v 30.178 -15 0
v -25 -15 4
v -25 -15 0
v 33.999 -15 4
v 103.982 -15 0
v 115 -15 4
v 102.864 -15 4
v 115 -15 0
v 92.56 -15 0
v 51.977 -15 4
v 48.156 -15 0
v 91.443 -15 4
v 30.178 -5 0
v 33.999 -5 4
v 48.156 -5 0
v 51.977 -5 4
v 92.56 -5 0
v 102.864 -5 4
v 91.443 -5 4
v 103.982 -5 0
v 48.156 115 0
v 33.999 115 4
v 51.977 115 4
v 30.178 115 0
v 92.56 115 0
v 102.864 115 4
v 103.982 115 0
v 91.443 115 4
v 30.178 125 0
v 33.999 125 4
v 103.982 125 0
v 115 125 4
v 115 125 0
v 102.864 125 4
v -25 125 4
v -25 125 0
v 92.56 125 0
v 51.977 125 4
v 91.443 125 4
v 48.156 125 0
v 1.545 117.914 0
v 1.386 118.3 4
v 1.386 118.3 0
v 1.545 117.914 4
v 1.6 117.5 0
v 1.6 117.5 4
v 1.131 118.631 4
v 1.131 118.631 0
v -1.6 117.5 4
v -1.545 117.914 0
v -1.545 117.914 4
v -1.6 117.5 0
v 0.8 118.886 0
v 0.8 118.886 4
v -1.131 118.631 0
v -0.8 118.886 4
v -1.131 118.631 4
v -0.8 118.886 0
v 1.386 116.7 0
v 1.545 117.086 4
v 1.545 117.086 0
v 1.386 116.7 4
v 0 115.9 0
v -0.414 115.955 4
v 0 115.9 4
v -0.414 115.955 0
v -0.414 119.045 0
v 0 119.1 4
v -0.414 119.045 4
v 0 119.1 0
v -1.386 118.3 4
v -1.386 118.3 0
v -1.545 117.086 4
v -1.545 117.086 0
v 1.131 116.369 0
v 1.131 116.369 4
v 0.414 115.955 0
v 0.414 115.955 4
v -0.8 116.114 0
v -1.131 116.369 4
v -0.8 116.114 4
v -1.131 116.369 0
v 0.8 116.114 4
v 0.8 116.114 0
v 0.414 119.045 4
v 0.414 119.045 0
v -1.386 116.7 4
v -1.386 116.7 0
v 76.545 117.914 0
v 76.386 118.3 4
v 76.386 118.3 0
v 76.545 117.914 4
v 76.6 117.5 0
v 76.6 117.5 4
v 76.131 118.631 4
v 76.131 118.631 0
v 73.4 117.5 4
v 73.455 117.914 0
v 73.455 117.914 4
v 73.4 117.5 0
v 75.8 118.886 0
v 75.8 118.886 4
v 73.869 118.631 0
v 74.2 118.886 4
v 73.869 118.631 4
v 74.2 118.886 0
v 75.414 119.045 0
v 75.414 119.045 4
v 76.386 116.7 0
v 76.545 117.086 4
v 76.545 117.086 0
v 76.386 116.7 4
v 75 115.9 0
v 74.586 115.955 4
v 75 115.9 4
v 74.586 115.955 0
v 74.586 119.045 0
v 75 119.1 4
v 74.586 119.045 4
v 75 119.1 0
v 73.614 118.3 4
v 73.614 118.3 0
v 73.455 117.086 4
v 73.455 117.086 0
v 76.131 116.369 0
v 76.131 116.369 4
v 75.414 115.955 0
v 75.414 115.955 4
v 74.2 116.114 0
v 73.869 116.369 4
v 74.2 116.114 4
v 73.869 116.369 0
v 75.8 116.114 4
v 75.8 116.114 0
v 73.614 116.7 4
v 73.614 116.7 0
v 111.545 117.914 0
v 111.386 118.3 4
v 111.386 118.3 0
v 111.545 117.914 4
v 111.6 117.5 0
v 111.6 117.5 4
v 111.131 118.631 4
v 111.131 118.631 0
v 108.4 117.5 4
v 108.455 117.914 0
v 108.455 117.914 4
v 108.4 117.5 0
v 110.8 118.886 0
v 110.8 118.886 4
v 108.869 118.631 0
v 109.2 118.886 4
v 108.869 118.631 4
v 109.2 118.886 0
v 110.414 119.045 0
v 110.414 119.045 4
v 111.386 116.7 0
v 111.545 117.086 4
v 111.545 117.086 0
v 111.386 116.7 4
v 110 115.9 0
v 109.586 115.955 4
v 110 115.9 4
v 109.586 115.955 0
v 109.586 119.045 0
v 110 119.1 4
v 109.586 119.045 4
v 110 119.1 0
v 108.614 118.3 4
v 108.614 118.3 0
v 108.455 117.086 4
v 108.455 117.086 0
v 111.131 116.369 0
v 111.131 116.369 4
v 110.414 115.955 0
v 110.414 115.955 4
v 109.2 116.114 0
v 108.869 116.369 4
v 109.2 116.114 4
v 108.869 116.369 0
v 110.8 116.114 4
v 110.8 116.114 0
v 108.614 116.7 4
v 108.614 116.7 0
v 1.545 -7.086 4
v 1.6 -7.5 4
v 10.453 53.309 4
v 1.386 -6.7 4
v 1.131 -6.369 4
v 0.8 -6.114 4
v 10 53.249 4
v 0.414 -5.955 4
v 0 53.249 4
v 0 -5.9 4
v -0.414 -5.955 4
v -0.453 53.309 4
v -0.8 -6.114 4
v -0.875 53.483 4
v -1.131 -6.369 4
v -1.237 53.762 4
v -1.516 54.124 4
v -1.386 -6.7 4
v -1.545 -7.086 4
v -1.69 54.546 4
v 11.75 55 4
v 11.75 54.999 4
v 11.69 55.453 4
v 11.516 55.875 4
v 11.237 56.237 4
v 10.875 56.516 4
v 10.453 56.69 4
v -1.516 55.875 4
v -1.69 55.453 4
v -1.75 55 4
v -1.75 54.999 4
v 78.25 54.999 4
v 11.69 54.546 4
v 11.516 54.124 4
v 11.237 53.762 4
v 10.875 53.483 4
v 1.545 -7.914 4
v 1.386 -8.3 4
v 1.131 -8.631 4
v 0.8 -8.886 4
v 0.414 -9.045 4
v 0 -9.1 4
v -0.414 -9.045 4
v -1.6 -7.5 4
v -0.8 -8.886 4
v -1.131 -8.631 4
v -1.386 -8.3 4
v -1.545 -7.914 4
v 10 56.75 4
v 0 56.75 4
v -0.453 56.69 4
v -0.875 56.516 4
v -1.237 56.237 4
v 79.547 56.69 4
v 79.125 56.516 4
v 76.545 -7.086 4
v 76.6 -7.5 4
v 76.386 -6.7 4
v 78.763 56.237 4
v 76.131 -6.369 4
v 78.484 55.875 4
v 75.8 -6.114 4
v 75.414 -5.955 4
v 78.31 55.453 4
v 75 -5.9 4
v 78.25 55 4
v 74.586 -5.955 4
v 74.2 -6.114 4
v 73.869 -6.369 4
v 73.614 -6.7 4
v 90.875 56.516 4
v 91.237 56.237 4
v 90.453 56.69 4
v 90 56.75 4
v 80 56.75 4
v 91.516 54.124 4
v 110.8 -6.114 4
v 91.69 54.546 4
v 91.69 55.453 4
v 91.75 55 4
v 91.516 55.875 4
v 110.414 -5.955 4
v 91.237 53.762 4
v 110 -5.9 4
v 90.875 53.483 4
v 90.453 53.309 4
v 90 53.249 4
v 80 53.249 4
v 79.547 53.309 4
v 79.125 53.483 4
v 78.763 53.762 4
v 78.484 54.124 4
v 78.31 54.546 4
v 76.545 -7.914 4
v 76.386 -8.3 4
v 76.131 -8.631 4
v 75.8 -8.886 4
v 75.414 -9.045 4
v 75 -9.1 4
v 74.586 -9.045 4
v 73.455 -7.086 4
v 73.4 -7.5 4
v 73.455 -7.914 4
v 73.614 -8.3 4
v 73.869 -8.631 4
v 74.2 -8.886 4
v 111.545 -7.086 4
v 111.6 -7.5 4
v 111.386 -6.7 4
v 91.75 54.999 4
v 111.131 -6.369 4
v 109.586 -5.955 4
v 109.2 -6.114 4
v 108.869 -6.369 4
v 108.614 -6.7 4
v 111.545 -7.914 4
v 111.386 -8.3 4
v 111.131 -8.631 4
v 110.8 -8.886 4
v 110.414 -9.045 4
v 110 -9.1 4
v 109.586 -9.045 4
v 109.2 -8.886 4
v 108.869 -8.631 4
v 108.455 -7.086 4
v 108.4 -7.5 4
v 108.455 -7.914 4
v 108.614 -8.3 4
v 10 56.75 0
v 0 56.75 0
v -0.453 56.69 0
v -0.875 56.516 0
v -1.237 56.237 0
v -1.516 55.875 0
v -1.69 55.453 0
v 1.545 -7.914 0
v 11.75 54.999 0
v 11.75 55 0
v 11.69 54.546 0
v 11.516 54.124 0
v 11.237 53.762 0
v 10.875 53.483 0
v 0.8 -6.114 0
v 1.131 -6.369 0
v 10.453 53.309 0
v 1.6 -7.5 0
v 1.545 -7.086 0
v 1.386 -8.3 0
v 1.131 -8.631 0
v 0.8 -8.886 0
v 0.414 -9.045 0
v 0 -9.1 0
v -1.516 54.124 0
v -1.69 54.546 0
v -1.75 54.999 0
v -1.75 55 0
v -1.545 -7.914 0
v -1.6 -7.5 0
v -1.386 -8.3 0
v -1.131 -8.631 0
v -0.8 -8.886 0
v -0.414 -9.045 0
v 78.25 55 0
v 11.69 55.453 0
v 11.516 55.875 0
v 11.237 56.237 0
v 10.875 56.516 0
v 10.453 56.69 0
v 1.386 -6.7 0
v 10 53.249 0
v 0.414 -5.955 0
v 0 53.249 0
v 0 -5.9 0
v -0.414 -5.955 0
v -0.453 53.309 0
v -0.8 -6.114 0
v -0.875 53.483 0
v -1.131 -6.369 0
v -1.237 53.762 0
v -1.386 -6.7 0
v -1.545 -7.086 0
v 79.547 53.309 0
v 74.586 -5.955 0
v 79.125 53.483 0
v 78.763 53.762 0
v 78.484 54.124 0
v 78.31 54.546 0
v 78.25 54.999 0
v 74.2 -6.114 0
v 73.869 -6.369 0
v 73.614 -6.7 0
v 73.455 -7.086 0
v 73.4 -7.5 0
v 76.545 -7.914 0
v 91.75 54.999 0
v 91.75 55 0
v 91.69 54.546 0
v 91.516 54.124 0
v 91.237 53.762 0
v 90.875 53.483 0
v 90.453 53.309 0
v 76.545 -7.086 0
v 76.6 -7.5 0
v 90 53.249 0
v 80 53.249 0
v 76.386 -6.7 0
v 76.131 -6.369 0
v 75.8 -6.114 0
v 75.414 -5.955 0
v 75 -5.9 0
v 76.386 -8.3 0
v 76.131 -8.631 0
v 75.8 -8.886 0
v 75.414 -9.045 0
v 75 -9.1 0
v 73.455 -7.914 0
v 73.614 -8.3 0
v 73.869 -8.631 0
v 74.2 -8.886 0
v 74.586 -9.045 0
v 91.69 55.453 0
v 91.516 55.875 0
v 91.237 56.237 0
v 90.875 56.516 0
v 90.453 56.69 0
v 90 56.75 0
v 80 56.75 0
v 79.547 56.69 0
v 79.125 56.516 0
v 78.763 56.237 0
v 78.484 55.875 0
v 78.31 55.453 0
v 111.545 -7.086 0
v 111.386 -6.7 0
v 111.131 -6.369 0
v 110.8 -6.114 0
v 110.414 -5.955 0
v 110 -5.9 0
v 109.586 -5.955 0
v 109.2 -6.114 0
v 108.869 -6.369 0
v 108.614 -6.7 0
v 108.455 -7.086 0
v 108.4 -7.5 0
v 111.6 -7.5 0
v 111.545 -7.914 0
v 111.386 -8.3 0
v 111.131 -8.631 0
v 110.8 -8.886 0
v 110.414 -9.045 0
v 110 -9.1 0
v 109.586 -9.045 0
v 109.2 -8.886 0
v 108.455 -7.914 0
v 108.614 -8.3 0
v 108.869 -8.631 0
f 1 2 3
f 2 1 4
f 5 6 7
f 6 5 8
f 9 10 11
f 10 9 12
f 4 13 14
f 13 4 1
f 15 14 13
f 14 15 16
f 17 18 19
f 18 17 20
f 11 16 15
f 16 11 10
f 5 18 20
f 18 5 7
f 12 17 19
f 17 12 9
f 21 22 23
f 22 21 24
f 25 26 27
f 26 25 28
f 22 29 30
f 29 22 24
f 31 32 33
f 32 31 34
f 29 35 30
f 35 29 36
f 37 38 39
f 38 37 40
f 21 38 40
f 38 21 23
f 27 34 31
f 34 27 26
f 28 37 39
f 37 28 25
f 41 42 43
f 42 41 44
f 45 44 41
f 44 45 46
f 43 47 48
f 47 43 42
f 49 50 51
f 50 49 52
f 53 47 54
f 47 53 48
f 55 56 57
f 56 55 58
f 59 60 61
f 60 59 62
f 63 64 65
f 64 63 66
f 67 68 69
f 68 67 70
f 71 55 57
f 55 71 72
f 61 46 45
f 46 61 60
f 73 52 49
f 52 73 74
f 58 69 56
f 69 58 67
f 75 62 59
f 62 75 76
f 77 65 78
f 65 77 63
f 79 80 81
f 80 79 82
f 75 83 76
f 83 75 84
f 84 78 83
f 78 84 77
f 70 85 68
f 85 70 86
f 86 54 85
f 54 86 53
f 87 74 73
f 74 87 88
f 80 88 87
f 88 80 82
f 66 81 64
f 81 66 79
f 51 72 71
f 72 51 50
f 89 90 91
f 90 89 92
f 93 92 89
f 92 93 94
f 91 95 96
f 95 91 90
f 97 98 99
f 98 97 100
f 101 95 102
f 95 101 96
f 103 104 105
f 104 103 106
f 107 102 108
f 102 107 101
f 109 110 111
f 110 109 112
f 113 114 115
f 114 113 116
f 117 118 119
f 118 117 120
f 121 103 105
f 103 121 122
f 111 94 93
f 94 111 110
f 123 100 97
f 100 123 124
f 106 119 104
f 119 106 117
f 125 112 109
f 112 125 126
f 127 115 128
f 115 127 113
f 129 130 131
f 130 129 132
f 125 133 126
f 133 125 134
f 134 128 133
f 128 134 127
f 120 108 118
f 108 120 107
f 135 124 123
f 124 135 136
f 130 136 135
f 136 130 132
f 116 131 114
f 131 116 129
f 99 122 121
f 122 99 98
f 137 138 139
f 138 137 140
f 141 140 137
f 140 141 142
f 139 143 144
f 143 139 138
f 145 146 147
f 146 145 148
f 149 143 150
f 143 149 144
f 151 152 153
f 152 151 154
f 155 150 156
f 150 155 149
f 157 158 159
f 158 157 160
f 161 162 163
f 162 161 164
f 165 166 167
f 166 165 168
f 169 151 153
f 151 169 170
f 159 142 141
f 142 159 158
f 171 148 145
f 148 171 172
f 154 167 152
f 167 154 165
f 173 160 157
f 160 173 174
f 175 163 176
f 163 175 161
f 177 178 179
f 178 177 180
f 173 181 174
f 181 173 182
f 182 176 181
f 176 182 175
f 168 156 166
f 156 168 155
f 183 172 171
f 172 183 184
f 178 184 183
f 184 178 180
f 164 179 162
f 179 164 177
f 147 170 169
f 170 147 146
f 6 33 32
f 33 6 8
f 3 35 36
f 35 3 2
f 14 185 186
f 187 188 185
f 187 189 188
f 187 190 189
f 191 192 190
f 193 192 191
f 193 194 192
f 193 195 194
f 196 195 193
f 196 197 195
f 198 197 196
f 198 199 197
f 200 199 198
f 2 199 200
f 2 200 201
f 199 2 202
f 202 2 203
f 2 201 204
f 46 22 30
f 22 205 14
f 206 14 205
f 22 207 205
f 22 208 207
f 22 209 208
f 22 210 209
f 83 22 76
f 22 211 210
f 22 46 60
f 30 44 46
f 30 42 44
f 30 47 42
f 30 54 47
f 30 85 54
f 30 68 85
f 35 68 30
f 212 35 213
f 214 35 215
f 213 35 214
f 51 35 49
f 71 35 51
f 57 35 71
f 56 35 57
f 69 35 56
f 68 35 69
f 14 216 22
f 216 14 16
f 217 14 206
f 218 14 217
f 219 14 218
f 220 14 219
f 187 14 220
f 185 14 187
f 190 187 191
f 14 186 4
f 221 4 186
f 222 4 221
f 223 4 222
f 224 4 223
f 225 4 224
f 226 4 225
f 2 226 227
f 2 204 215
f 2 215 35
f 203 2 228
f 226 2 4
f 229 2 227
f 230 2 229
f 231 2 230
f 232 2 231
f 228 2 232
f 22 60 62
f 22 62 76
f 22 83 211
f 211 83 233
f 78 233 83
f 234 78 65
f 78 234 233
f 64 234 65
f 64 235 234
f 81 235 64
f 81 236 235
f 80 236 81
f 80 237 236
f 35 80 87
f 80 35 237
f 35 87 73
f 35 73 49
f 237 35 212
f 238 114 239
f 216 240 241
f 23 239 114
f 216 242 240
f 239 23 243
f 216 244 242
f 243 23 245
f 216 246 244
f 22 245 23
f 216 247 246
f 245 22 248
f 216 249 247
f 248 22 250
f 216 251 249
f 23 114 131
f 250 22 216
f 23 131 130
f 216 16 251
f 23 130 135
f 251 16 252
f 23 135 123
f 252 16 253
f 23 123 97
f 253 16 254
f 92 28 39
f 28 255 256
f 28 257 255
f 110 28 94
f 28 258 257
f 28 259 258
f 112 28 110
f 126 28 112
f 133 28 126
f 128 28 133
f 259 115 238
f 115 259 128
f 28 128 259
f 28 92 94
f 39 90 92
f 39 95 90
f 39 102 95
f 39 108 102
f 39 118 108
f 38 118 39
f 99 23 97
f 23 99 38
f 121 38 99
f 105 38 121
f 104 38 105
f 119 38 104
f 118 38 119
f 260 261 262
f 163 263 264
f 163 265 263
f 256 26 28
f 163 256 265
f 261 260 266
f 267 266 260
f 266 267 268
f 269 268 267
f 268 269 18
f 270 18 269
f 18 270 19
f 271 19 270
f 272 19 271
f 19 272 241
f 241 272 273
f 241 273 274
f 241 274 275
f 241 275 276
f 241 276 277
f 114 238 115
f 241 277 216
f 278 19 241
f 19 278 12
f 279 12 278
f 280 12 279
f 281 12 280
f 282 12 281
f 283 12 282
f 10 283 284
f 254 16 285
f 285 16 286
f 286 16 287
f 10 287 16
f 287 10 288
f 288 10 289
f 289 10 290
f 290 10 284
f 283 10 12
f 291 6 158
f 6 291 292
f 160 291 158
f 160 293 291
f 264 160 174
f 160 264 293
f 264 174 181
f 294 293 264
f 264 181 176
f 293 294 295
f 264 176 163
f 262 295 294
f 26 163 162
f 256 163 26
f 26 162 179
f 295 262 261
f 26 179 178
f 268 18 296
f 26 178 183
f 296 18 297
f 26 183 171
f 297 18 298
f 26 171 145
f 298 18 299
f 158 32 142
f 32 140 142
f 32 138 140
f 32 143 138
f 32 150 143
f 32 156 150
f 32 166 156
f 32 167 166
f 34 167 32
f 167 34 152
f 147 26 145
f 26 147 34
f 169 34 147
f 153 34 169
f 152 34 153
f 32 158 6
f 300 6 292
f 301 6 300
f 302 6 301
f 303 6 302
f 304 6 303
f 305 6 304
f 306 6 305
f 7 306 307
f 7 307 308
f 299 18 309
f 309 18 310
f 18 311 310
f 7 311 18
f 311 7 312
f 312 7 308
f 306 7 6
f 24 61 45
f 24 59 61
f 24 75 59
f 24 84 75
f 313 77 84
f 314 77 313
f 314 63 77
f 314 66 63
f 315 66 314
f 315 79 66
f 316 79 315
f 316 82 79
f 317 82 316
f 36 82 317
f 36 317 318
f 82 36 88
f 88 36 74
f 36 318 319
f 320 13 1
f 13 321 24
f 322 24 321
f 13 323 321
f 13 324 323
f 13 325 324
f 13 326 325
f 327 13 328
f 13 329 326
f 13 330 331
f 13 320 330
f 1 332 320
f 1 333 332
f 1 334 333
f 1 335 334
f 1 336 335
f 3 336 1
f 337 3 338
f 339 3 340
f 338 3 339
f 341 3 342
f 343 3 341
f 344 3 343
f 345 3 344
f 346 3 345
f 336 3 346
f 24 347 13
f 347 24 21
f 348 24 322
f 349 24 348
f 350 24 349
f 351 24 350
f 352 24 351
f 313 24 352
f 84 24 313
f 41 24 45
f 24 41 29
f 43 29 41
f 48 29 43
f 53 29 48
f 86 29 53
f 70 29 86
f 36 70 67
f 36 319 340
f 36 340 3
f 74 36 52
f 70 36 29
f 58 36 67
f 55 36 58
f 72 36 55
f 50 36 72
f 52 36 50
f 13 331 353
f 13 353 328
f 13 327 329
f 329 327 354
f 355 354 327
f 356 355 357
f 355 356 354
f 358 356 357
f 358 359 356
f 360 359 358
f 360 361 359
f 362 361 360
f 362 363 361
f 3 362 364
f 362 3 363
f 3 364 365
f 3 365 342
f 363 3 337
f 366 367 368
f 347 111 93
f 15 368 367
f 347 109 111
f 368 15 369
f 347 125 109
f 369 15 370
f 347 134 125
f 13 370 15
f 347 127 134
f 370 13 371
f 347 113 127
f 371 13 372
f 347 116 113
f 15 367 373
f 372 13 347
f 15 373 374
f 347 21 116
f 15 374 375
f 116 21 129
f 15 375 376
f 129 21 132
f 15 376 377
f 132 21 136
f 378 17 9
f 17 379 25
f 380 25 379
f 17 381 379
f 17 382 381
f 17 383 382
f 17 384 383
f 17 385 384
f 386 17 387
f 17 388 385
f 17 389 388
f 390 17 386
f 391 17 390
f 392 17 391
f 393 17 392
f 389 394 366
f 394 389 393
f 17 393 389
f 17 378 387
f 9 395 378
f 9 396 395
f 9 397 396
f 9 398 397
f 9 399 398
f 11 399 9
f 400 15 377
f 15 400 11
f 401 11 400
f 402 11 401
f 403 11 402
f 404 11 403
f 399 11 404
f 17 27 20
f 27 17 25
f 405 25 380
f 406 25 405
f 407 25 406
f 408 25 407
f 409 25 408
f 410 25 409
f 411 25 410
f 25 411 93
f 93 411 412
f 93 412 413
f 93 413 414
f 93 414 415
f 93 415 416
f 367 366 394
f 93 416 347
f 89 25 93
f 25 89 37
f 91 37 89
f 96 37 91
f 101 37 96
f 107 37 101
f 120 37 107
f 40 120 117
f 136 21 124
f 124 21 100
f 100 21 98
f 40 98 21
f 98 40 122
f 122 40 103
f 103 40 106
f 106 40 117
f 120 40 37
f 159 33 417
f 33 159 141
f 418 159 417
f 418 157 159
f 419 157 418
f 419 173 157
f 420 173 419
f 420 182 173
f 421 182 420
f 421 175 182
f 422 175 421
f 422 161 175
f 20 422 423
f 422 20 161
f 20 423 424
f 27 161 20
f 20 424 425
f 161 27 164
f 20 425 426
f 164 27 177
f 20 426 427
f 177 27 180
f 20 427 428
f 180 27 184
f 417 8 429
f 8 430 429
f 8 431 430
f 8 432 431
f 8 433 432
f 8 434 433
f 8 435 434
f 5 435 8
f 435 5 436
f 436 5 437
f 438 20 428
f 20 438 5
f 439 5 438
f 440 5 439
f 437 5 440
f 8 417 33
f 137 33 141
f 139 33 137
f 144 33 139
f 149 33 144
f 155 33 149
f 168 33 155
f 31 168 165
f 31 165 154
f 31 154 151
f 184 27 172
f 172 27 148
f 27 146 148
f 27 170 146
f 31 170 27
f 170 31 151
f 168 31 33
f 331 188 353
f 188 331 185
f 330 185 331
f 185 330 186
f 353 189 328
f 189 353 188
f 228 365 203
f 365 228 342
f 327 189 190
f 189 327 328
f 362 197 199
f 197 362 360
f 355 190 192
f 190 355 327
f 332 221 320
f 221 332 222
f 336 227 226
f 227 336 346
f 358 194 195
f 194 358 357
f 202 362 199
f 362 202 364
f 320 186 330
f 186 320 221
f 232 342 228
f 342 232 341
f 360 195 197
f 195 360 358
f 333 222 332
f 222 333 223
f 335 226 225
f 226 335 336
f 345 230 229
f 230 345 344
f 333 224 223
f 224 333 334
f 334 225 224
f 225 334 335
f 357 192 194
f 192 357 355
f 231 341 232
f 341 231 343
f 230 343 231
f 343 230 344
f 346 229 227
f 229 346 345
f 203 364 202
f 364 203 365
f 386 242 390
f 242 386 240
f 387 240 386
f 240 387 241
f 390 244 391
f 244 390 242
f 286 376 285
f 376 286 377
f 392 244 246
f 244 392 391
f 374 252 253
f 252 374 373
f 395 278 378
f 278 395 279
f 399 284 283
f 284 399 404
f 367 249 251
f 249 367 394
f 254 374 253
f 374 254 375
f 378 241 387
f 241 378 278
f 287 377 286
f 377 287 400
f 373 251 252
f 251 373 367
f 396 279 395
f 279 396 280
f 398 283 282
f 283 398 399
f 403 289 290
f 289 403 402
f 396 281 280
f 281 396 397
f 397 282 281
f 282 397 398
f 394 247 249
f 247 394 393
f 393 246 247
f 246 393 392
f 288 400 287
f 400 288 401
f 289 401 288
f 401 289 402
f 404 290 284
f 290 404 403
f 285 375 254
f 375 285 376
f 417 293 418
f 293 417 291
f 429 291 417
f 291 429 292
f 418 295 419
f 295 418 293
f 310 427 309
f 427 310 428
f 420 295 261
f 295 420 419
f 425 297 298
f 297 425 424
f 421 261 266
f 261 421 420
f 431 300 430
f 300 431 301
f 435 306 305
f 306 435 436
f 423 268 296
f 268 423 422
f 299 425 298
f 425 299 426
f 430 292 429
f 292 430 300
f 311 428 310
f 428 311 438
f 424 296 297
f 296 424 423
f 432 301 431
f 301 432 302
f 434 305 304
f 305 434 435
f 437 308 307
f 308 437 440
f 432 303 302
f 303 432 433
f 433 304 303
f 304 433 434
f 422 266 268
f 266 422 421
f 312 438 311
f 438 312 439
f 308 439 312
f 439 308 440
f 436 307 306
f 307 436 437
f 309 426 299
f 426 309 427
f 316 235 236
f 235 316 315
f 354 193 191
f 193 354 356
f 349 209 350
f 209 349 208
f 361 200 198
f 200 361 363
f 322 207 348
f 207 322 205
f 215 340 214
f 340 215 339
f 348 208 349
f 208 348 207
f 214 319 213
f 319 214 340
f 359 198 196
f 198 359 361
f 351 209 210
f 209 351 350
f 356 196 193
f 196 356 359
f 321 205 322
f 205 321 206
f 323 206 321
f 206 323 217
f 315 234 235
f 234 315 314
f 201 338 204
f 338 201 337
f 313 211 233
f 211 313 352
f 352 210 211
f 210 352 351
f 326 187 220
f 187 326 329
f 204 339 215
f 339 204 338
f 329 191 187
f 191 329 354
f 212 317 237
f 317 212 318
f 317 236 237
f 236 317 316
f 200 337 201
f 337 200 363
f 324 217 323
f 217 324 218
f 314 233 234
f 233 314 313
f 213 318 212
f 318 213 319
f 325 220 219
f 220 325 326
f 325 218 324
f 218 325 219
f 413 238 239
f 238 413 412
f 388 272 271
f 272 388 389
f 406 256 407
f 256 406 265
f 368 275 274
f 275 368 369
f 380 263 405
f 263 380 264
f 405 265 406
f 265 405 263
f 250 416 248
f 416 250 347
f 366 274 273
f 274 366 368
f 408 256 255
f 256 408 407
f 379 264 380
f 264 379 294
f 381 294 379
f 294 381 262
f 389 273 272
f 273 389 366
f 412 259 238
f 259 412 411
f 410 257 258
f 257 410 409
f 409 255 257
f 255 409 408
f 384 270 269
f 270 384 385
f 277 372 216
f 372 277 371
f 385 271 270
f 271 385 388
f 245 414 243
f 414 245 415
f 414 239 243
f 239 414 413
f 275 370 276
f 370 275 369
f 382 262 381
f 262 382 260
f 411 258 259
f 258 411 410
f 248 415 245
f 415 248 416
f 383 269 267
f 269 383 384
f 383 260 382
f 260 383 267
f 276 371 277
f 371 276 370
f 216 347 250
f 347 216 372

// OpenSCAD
$fn=24;

translate([0,0,-41])rotate([90,0,0])
difference(){

translate([-25,41,-125])cube([140,4,140]);

translate([0,0,5])rotate([0,0,3.71])
bogie();
translate([0,0,-125])rotate([0,0,3.71])
bogie();

translate([0,34,7.5])
rotate([-90,0,0])cylinder(d=3.2,h=12);
translate([75,34,7.5])
rotate([-90,0,0])cylinder(d=3.2,h=12);
translate([110,34,7.5])
rotate([-90,0,0])cylinder(d=3.2,h=12);

translate([0,0,-125]){
translate([0,34,7.5])
rotate([-90,0,0])cylinder(d=3.2,h=12);
translate([75,34,7.5])
rotate([-90,0,0])cylinder(d=3.2,h=12);
translate([110,34,7.5])
rotate([-90,0,0])cylinder(d=3.2,h=12);
}

translate([0,50,-55])
minkowski(){
rotate([90,0,0])cylinder(d=3.5,h=10);
cube([10,0.001,0.001]);
}
translate([80,50,-55])
minkowski(){
rotate([90,0,0])cylinder(d=3.5,h=10);
cube([10,0.001,0.001]);
}

}

module bogie(){

rotate([0,0,42.6])
translate([3,-6.5,0])cube([116,13,10]);

translate([108,0,0])rotate([0,0,101.9])
translate([3,-5.5,0])cube([78,11,10]);

}
